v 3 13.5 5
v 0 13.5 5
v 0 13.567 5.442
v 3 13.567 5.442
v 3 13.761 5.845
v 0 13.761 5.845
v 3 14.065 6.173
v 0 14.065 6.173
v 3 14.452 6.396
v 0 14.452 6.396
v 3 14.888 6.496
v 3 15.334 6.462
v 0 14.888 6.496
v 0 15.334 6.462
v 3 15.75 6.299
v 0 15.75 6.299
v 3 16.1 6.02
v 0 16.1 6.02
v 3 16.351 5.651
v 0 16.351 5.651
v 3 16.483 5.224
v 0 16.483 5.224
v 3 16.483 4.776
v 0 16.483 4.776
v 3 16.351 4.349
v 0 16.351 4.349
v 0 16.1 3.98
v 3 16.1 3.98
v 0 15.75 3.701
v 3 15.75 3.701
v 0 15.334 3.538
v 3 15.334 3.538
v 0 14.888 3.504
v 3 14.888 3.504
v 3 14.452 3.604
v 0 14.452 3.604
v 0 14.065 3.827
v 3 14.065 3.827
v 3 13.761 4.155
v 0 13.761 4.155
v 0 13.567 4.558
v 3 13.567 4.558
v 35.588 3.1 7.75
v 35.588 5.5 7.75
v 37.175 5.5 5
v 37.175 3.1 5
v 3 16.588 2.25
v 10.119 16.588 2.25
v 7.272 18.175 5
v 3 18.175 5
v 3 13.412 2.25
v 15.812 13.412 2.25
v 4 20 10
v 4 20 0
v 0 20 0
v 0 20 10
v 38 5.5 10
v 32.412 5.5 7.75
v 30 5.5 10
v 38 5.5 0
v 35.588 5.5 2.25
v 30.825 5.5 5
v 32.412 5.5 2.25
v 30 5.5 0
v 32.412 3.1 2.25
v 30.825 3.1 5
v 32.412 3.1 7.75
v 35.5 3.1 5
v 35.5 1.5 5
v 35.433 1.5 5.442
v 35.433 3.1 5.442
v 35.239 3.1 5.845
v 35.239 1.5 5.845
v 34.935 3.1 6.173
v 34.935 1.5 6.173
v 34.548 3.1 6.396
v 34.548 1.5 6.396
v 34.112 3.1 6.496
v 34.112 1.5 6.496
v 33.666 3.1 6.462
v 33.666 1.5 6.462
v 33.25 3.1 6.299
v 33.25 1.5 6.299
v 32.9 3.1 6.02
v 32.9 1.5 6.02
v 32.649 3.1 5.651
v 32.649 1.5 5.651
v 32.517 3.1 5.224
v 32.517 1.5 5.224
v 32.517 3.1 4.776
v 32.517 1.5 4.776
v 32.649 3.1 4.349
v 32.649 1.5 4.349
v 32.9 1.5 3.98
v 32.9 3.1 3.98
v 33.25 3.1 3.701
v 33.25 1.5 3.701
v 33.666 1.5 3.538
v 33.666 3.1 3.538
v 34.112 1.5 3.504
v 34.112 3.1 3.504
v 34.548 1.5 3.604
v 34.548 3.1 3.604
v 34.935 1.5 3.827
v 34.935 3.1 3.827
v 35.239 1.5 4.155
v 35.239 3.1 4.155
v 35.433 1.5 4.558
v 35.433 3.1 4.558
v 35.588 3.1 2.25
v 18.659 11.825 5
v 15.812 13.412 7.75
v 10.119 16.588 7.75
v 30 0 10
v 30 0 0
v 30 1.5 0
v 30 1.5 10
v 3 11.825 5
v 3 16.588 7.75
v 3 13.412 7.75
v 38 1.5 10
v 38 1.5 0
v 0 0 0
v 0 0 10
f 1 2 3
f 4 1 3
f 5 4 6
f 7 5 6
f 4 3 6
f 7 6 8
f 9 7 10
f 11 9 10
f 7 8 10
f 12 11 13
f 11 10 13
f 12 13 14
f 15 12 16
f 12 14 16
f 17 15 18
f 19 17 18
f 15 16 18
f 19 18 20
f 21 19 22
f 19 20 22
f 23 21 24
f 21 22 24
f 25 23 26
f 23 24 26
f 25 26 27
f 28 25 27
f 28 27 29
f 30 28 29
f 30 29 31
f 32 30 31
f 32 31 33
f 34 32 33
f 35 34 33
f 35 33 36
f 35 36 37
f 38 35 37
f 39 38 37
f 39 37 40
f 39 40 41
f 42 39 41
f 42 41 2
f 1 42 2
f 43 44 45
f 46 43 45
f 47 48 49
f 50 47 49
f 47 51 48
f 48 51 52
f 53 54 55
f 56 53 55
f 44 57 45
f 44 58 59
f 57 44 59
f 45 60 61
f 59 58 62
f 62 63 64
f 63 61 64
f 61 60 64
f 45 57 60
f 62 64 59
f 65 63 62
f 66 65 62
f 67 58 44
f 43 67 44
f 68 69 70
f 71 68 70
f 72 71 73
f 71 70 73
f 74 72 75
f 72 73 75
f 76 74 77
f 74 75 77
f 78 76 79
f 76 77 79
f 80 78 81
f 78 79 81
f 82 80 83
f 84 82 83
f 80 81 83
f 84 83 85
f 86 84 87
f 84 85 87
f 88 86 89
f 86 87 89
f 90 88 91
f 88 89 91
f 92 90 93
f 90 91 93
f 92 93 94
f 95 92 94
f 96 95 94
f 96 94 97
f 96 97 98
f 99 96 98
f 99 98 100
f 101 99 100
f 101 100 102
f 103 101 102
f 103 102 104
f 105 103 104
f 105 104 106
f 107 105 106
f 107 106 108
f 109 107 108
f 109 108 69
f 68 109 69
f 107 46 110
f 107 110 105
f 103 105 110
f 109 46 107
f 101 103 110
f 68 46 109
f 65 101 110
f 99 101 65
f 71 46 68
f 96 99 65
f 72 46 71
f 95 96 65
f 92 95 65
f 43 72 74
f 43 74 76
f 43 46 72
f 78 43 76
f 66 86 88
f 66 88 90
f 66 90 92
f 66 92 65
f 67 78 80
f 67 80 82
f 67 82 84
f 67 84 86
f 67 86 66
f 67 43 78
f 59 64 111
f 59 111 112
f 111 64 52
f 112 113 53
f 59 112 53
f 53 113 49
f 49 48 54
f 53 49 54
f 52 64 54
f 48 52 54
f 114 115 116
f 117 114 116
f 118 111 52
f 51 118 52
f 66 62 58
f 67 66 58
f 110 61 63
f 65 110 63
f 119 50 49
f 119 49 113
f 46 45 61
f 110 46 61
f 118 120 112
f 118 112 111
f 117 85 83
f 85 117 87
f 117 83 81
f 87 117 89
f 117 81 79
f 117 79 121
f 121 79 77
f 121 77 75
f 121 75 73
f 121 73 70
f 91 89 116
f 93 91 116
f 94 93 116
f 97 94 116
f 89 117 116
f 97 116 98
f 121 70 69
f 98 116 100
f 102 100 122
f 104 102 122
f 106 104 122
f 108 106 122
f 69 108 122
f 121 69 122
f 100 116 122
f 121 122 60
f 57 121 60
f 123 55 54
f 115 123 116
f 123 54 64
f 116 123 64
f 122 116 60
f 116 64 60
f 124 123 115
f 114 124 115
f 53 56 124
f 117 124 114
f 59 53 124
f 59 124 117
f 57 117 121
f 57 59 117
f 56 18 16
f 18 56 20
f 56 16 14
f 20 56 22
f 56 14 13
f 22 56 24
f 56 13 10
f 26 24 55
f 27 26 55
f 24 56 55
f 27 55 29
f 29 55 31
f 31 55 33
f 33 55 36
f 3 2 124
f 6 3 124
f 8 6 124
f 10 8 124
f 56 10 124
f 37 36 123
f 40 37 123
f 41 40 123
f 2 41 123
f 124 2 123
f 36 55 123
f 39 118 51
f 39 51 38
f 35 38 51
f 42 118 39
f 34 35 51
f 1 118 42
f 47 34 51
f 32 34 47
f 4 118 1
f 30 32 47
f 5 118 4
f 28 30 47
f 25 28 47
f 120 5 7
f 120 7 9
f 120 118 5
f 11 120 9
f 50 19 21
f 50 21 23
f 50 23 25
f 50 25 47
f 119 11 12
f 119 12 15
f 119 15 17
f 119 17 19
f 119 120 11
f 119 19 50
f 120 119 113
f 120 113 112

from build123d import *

# Parameters (mm, degrees)
PAD_DEPTH       = 10
SKETCH001_R     = 1.5
POCKET_DEPTH    = 18.501
POCKET001_DEPTH = 2.4
SKETCH003_R     = 1.5
POCKET002_DEPTH = 38.001
POCKET003_DEPTH = 35


with BuildPart() as part:
    # Sketch → Pad (new body)
    with BuildSketch(Plane.XY):
        Polygon((0, 0), (30, 0), (30, 1.5), (38, 1.5), (38, 5.5), (30, 5.5), (4, 20), (0, 20), align=None)
    extrude(amount=PAD_DEPTH)

    # Sketch001 (on Face3 of Pad) → Pocket (cut, through all)
    with BuildSketch(Plane(origin=(30, 1.5, 0), x_dir=(1, 0, 0), z_dir=(0, -1, 0))):
        with Locations((4, 5)):
            Circle(SKETCH001_R)
    extrude(amount=-POCKET_DEPTH, mode=Mode.SUBTRACT)

    # Sketch002 (on Face9 of Pocket) → Pocket001 (cut)
    with BuildSketch(Plane(origin=(0, 5.5, 0), x_dir=(-1, 0, 0), z_dir=(0, 1, 0))):
        Polygon((-30.824574, 5), (-32.412287, 7.75), (-35.587713, 7.75), (-37.175426, 5), (-35.587713, 2.25), (-32.412287, 2.25), align=None)
    extrude(amount=-POCKET001_DEPTH, mode=Mode.SUBTRACT)

    # Sketch003 (on Face2 of Pocket001) → Pocket002 (cut, through all)
    with BuildSketch(Plane(origin=(0, 0, 0), x_dir=(0, -1, 0), z_dir=(-1, 0, 0))):
        with Locations((-15, 5)):
            Circle(SKETCH003_R)
    extrude(amount=-POCKET002_DEPTH, mode=Mode.SUBTRACT)

    # Sketch004 (on Face9 of Pocket002) → Pocket003 (cut)
    with BuildSketch(Plane.YZ.offset(38)):
        Polygon((16.587713, 2.25), (18.175426, 5), (16.587713, 7.75), (13.412287, 7.75), (11.824574, 5), (13.412287, 2.25), align=None)
    extrude(amount=-POCKET003_DEPTH, mode=Mode.SUBTRACT)


solid = part.part
